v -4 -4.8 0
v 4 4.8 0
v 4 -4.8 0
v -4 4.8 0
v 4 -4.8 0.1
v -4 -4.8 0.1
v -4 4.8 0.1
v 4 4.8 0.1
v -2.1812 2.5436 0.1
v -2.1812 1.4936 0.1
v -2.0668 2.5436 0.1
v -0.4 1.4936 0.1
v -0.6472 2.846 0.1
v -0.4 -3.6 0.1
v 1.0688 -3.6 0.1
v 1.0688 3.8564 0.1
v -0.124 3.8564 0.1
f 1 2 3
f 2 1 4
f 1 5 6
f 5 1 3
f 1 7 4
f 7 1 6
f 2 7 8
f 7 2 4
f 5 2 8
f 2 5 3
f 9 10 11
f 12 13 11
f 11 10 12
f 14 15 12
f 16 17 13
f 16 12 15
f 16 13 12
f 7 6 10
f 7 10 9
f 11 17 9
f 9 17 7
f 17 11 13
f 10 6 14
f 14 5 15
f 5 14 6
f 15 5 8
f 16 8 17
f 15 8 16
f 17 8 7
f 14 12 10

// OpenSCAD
// file: ../p/box5-12.scad
use <../lib.scad>
function ldraw_lib__box5_12() = [
// 0 Box with 5 Faces without Any Edges
// 0 Name: box5-12.dat
// 0 Author: Chris Dee [cwdee]
// 0 !LDRAW_ORG Primitive UPDATE 2009-02
// 0 !LICENSE Licensed under CC BY 4.0 : see CAreadme.txt
// 
// 0 BFC CERTIFY CCW
  [0,"BFC","CERTIFY"],
  [0,"BFC","CCW"],
// 
// 0 !HISTORY 2009-09-03 [PTadmin] Official Update 2009-02
// 
// 
// 4 16 1 1 1 1 1 -1 -1 1 -1 -1 1 1
  [4,16,1,1,1,1,1,-1,-1,1,-1,-1,1,1],
// 4 16 -1 0 1 1 0 1 1 1 1 -1 1 1
  [4,16,-1,0,1,1,0,1,1,1,1,-1,1,1],
// 4 16 -1 0 -1 -1 0 1 -1 1 1 -1 1 -1
  [4,16,-1,0,-1,-1,0,1,-1,1,1,-1,1,-1],
// 4 16 1 0 -1 -1 0 -1 -1 1 -1 1 1 -1
  [4,16,1,0,-1,-1,0,-1,-1,1,-1,1,1,-1],
// 4 16 1 0 1 1 0 -1 1 1 -1 1 1 1
  [4,16,1,0,1,1,0,-1,1,1,-1,1,1,1],
// 0
];
module ldraw_lib__box5_12(step=0, col=false, unit=2/5, alt=false, line=0.2, solid=!$preview)
    makepoly(ldraw_lib__box5_12(), step=step, col=col, unit=unit, alt=alt, line=line, solid=solid);
ldraw_lib__box5_12(line=0.2);
// file: 191888c.scad
use <../lib.scad>
use <../p/box5-12.scad>
function ldraw_lib__191888c() = [
// 0 Sticker  1.2 x  1 with White "1"
// 0 Name: 191888c.dat
// 0 Author: Steffen [Steffen]
// 0 !LDRAW_ORG Part UPDATE 2012-01
// 0 !LICENSE Licensed under CC BY 4.0 : see CAreadme.txt
// 
// 0 BFC CERTIFY CCW
  [0,"BFC","CERTIFY"],
  [0,"BFC","CCW"],
// 
// 0 !KEYWORDS set 7710
// 
// 0 !HISTORY 2012-03-30 [PTadmin] Official Update 2012-01
// 
// 
// 1 16 0 -0.25 0 10 0 0 0 0.25 0 0 0 -12 box5-12.dat
  [1,16,0,-0.25,0,10,0,0,0,0.25,0,0,0,-12, ldraw_lib__box5_12()],
// 3 15 -5.453 -0.25 6.359 -5.453 -0.25 3.734 -5.167 -0.25 6.359
  [3,15,-5.453,-0.25,6.359,-5.453,-0.25,3.734,-5.167,-0.25,6.359],
// 3 15 -1 -0.25 3.734 -1.618 -0.25 7.115 -5.167 -0.25 6.359
  [3,15,-1,-0.25,3.734,-1.618,-0.25,7.115,-5.167,-0.25,6.359],
// 3 15 -5.167 -0.25 6.359 -5.453 -0.25 3.734 -1 -0.25 3.734
  [3,15,-5.167,-0.25,6.359,-5.453,-0.25,3.734,-1,-0.25,3.734],
// 3 15 -1 -0.25 -9 2.672 -0.25 -9 -1 -0.25 3.734
  [3,15,-1,-0.25,-9,2.672,-0.25,-9,-1,-0.25,3.734],
// 3 15 2.672 -0.25 9.641 -0.31 -0.25 9.641 -1.618 -0.25 7.115
  [3,15,2.672,-0.25,9.641,-0.31,-0.25,9.641,-1.618,-0.25,7.115],
// 3 15 2.672 -0.25 9.641 -1 -0.25 3.734 2.672 -0.25 -9
  [3,15,2.672,-0.25,9.641,-1,-0.25,3.734,2.672,-0.25,-9],
// 3 15 2.672 -0.25 9.641 -1.618 -0.25 7.115 -1 -0.25 3.734
  [3,15,2.672,-0.25,9.641,-1.618,-0.25,7.115,-1,-0.25,3.734],
// 3 16 -10 -0.25 12 -10 -0.25 -12 -5.453 -0.25 3.734
  [3,16,-10,-0.25,12,-10,-0.25,-12,-5.453,-0.25,3.734],
// 3 16 -10 -0.25 12 -5.453 -0.25 3.734 -5.453 -0.25 6.359
  [3,16,-10,-0.25,12,-5.453,-0.25,3.734,-5.453,-0.25,6.359],
// 3 16 -5.167 -0.25 6.359 -0.31 -0.25 9.641 -5.453 -0.25 6.359
  [3,16,-5.167,-0.25,6.359,-0.31,-0.25,9.641,-5.453,-0.25,6.359],
// 3 16 -5.453 -0.25 6.359 -0.31 -0.25 9.641 -10 -0.25 12
  [3,16,-5.453,-0.25,6.359,-0.31,-0.25,9.641,-10,-0.25,12],
// 3 16 -0.31 -0.25 9.641 -5.167 -0.25 6.359 -1.618 -0.25 7.115
  [3,16,-0.31,-0.25,9.641,-5.167,-0.25,6.359,-1.618,-0.25,7.115],
// 3 16 -5.453 -0.25 3.734 -10 -0.25 -12 -1 -0.25 -9
  [3,16,-5.453,-0.25,3.734,-10,-0.25,-12,-1,-0.25,-9],
// 3 16 -1 -0.25 -9 10 -0.25 -12 2.672 -0.25 -9
  [3,16,-1,-0.25,-9,10,-0.25,-12,2.672,-0.25,-9],
// 3 16 10 -0.25 -12 -1 -0.25 -9 -10 -0.25 -12
  [3,16,10,-0.25,-12,-1,-0.25,-9,-10,-0.25,-12],
// 3 16 2.672 -0.25 -9 10 -0.25 -12 10 -0.25 12
  [3,16,2.672,-0.25,-9,10,-0.25,-12,10,-0.25,12],
// 3 16 2.672 -0.25 9.641 10 -0.25 12 -0.31 -0.25 9.641
  [3,16,2.672,-0.25,9.641,10,-0.25,12,-0.31,-0.25,9.641],
// 3 16 2.672 -0.25 -9 10 -0.25 12 2.672 -0.25 9.641
  [3,16,2.672,-0.25,-9,10,-0.25,12,2.672,-0.25,9.641],
// 3 16 -0.31 -0.25 9.641 10 -0.25 12 -10 -0.25 12
  [3,16,-0.31,-0.25,9.641,10,-0.25,12,-10,-0.25,12],
// 3 16 -1 -0.25 -9 -1 -0.25 3.734 -5.453 -0.25 3.734
  [3,16,-1,-0.25,-9,-1,-0.25,3.734,-5.453,-0.25,3.734],
];
module ldraw_lib__191888c(step=0, col=false, unit=2/5, alt=false, line=0.2, solid=!$preview)
    makepoly(ldraw_lib__191888c(), step=step, col=col, unit=unit, alt=alt, line=line, solid=solid);
ldraw_lib__191888c(line=0.2);
// main file
use <../lib.scad>
use <191888c.scad>
function ldraw_lib__196925c() = [
// 0 =Sticker  1.2 x  1 with White "1"
// 0 Name: 196925c.dat
// 0 Author: Takeshi Takahashi [RainbowDolphin]
// 0 !LDRAW_ORG Part Alias UPDATE 2025-03
// 0 !LICENSE Licensed under CC BY 4.0 : see CAreadme.txt
// 
// 0 BFC CERTIFY CCW
  [0,"BFC","CERTIFY"],
  [0,"BFC","CCW"],
// 
// 0 !KEYWORDS 12V Train, Bricklink 7715stk01, Brickowl 717614
// 0 !KEYWORDS Push-Along Passenger Steam Train, Rebrickable 196925, Set 7715
// 
// 0 !HISTORY 2025-03-30 [OrionP] Official Update 2025-03
// 
// 1 16 0 0 0 1 0 0 0 1 0 0 0 1 191888c.dat
  [1,16,0,0,0,1,0,0,0,1,0,0,0,1, ldraw_lib__191888c()],
];
module ldraw_lib__196925c(step=0, col=false, unit=2/5, alt=false, line=0.2, solid=!$preview)
    makepoly(ldraw_lib__196925c(), step=step, col=col, unit=unit, alt=alt, line=line, solid=solid);
ldraw_lib__196925c(line=0.2);
